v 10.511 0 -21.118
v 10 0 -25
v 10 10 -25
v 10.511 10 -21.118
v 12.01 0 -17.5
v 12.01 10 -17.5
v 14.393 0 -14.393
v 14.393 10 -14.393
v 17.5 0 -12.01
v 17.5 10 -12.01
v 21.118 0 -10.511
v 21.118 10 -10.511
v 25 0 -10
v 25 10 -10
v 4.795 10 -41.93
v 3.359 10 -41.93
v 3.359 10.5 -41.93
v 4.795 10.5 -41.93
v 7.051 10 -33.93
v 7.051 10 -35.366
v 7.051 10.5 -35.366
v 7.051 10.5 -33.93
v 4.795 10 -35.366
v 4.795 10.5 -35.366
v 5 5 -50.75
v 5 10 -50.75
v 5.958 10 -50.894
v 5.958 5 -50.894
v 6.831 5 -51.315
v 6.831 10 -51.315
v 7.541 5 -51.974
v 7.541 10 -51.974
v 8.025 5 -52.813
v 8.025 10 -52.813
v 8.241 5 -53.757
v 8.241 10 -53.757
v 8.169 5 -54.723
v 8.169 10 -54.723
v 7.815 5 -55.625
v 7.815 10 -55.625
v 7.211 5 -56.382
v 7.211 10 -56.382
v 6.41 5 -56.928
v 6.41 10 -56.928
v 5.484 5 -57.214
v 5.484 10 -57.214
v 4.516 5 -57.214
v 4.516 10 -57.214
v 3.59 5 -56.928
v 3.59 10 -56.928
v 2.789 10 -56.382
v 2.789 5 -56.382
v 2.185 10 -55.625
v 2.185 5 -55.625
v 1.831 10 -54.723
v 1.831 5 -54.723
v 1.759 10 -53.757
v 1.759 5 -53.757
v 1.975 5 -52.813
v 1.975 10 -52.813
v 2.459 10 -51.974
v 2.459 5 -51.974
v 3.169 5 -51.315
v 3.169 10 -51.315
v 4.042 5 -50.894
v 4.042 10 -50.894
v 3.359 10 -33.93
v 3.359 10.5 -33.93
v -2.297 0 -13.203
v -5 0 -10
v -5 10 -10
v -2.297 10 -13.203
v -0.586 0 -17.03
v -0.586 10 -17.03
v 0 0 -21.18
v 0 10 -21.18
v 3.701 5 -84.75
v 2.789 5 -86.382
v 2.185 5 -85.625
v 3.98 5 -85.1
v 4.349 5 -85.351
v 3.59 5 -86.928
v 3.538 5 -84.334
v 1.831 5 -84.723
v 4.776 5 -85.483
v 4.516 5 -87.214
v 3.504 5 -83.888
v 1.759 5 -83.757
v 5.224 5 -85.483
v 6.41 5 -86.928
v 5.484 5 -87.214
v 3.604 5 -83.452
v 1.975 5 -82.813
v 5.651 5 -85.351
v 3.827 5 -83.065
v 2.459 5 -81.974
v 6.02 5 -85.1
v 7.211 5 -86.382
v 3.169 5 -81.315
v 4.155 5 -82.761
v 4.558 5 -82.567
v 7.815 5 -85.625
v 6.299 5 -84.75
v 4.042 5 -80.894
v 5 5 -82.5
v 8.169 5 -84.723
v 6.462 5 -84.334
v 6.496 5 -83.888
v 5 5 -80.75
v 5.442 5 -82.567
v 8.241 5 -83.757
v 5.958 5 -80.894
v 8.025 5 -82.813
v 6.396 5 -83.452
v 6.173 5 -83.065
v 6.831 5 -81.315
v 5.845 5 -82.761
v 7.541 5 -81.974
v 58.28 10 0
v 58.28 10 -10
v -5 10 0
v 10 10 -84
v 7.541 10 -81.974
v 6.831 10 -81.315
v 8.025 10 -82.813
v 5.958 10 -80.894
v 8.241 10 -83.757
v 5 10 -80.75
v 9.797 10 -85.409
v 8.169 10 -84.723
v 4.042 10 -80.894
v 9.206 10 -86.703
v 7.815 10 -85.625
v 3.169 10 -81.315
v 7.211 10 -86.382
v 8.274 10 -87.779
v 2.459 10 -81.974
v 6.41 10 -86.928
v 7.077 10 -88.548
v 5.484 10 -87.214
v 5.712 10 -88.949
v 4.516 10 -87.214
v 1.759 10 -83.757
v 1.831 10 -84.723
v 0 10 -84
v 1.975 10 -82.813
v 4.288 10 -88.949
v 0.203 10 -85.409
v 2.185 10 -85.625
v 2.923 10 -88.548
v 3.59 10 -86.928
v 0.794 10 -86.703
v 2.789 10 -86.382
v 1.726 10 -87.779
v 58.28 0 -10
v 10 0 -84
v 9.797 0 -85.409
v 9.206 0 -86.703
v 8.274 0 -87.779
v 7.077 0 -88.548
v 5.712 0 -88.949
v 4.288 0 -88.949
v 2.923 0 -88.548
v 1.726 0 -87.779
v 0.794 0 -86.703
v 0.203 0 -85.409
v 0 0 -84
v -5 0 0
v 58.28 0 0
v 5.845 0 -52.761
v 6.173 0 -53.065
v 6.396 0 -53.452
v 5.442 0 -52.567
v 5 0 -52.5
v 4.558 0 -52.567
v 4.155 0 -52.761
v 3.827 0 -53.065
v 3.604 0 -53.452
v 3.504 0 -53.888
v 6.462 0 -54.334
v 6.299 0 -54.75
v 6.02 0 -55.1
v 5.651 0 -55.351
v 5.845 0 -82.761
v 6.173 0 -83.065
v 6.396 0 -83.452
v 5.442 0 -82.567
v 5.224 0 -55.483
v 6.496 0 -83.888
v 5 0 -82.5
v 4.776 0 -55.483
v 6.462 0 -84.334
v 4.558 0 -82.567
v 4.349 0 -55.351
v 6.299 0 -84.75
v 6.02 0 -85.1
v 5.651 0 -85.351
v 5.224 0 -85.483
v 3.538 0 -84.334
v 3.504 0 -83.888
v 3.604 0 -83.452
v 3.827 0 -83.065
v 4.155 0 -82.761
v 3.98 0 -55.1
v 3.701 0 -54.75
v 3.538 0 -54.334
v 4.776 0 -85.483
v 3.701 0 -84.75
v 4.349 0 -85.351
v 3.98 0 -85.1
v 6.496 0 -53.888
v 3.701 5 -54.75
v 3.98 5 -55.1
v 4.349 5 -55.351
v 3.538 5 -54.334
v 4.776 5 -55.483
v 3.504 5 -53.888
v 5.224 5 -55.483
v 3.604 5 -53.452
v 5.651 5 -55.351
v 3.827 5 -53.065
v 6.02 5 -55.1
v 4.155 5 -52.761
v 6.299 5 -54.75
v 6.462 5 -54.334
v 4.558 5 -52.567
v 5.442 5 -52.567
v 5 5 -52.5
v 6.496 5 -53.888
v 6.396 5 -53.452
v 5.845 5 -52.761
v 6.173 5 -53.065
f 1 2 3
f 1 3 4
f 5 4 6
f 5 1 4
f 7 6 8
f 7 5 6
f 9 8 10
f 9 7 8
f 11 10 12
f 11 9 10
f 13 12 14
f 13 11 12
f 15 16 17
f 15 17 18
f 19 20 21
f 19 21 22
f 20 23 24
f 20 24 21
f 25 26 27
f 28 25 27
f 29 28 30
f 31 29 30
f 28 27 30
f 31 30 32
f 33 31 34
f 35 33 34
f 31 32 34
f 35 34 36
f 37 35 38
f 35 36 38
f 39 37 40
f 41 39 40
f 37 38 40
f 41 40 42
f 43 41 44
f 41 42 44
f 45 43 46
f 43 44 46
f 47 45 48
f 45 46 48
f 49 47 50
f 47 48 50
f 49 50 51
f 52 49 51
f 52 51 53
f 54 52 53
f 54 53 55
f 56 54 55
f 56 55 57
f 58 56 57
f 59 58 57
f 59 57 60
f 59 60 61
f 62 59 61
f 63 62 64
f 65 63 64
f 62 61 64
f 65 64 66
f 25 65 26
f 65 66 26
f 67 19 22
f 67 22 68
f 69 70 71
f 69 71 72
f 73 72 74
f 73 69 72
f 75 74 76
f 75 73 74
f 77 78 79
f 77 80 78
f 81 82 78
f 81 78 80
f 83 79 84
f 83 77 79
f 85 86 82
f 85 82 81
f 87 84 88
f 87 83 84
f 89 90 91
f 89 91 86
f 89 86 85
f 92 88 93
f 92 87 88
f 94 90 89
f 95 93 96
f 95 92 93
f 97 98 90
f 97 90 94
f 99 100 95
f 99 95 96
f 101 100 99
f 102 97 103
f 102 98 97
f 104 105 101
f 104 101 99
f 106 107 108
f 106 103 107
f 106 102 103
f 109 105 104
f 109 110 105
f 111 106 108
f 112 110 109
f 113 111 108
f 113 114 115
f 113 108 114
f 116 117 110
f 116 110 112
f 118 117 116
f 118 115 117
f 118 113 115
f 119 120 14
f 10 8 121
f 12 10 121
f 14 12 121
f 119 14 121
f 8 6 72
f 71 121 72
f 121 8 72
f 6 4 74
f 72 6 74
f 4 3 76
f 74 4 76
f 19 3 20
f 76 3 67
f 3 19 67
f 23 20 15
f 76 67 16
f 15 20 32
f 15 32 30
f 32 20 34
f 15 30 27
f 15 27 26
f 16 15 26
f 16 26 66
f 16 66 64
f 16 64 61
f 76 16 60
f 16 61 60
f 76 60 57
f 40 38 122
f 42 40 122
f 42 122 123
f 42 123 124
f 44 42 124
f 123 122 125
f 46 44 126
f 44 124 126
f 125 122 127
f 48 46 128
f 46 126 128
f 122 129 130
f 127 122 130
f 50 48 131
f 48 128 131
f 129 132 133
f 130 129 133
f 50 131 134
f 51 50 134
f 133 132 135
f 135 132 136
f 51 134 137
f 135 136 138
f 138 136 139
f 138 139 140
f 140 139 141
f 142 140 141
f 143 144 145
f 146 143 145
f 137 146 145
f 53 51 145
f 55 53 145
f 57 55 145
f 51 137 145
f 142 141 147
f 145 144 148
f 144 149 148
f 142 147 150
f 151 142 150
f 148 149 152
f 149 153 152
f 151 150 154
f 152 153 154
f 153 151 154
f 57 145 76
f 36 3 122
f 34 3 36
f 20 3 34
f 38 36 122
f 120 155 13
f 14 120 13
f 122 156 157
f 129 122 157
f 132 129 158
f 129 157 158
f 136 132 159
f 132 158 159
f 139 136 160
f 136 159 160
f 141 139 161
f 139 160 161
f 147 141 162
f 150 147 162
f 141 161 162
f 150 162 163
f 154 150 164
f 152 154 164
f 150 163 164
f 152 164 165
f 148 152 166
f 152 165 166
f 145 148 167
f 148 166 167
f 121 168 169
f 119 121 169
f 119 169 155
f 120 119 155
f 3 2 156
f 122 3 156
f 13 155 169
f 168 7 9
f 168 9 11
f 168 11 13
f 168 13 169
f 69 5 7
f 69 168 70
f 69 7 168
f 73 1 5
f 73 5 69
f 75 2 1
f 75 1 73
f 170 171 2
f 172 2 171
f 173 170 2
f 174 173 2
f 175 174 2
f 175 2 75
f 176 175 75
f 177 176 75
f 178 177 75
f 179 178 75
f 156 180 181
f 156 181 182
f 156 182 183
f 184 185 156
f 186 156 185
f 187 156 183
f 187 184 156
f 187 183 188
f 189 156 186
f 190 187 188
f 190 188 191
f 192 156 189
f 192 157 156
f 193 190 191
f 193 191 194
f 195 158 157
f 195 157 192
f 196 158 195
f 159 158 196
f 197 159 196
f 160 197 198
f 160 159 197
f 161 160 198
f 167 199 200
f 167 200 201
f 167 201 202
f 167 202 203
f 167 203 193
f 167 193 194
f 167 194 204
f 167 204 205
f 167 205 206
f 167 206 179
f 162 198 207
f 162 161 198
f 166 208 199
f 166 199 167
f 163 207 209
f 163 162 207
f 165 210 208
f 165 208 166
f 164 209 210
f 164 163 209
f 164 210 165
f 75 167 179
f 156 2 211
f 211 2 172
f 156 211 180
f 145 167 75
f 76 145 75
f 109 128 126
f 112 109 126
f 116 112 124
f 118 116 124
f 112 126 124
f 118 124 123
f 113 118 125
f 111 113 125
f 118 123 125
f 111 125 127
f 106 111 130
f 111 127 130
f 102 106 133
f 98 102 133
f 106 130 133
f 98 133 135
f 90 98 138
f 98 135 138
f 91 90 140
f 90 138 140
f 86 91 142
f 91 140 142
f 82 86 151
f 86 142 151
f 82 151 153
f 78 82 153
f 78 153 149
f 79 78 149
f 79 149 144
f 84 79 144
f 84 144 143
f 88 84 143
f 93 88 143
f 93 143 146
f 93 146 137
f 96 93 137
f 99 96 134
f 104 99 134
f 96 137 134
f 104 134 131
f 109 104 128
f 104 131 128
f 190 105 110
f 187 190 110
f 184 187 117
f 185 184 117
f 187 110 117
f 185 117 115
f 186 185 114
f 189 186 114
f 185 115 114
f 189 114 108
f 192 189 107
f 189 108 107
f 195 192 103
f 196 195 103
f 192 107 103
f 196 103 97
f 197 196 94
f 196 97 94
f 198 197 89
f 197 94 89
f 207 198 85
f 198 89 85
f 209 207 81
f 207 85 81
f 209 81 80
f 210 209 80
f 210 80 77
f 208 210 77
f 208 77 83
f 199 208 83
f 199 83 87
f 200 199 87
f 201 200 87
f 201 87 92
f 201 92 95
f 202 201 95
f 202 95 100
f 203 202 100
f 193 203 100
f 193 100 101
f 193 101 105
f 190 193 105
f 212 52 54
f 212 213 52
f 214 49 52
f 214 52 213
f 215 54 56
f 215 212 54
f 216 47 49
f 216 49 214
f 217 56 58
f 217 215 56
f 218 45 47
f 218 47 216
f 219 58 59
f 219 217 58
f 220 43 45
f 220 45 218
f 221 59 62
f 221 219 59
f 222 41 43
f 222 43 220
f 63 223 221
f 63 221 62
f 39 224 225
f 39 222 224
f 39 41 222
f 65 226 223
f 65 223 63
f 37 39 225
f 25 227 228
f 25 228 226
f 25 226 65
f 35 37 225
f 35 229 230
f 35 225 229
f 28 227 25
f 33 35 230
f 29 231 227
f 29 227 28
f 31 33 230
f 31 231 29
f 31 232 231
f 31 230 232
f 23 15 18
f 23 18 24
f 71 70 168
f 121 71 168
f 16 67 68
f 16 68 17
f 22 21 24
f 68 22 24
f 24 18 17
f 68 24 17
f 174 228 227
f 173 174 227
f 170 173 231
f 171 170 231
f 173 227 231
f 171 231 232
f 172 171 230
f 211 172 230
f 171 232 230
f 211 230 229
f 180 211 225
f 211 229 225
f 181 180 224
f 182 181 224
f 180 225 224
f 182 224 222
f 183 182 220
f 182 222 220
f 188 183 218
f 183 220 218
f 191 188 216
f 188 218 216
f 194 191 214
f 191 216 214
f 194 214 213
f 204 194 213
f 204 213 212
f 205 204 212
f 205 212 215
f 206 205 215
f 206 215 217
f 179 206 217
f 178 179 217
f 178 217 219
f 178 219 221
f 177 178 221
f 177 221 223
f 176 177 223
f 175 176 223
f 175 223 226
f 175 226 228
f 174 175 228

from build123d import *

# Parameters (mm, degrees)
BOSS_EXTRUDE1_DEPTH = 10
SKETCH2_R           = 1.5
CUT_EXTRUDE1_DEPTH  = 107.852975625
BOSS_EXTRUDE2_DEPTH = 0.5
SKETCH5_R           = 3.25
CUT_EXTRUDE2_DEPTH  = 5
FILLET1_R           = 15


with BuildPart() as part:
    # Sketch1 → Boss-Extrude1 (new body)
    with BuildSketch(Plane(origin=(0, 0, 0), x_dir=(1, 0, 0), z_dir=(0, 1, 0))):
        with BuildLine():
            Line((0, 0), (10, 0))
            Line((10, 0), (58.28, 0))
            Line((58.28, 0), (58.28, 10))
            Line((58.28, 10), (10, 10))
            Line((10, 10), (10, 84))
            ThreePointArc((10, 84), (5, 89), (0, 84))
            Line((0, 84), (0, 10))
            Line((0, 10), (-5, 10))
            Line((-5, 10), (-5, 0))
            Line((-5, 0), (0, 0))
        make_face()
    extrude(amount=BOSS_EXTRUDE1_DEPTH)

    # Sketch2 → Cut-Extrude1 (cut, through all)
    with BuildSketch(Plane(origin=(0, 10, 0), x_dir=(1, 0, 0), z_dir=(0, 1, 0))):
        with Locations(Location((5, 84, 0), (0, 0, 270))):
            Circle(SKETCH2_R)
        with Locations(Location((5, 54, 0), (0, 0, 270))):
            Circle(SKETCH2_R)
    extrude(amount=-CUT_EXTRUDE1_DEPTH, mode=Mode.SUBTRACT)

    # Sketch4 → Boss-Extrude2 (add)
    with BuildSketch(Plane(origin=(0, 10, 0), x_dir=(1, 0, 0), z_dir=(0, 1, 0))):
        Polygon((3.358974359, 41.930004151), (4.794871795, 41.930004151), (4.794871795, 35.365901587), (7.051282051, 35.365901587), (7.051282051, 33.930004151), (3.358974359, 33.930004151), align=None)
    extrude(amount=BOSS_EXTRUDE2_DEPTH)

    # Sketch5 → Cut-Extrude2 (cut)
    with BuildSketch(Plane(origin=(0, 10, 0), x_dir=(1, 0, 0), z_dir=(0, 1, 0))):
        with Locations(Location((5, 84, 0), (0, 0, 270))):
            Circle(SKETCH5_R)
        with Locations(Location((5, 54, 0), (0, 0, 270))):
            Circle(SKETCH5_R)
    extrude(amount=-CUT_EXTRUDE2_DEPTH, mode=Mode.SUBTRACT)

    # Fillet1
    # the kernel refuses this fillet: 15 mm, written as the material it adds along each edge
    with BuildSketch(Plane(origin=(0, 0, -10), x_dir=(-1, 0, 0), z_dir=(0, 1, 0))) as fillet1_piece_1:
        with BuildLine():
            CenterArc((15, -11.180339887), FILLET1_R, 131.810314896, 48.189685104)
            Line((0, -11.180339887), (-0.3, -11.180339887))
            Line((-0.3, -11.180339887), (-0.3, 0))
            Line((-0.3, 0), (0, 0.3))
            ThreePointArc((0, 0.3), (2.5, 0.3), (4.8, 0.223606798))
            Line((4.8, 0.223606798), (5, 0))
        make_face()
    extrude(amount=10)
    with BuildSketch(Plane(origin=(10, 0, -10), x_dir=(1, 0, 0), z_dir=(0, 1, 0))) as fillet1_piece_2:
        with BuildLine():
            CenterArc((FILLET1_R, FILLET1_R), FILLET1_R, 180, 90)
            Line((0, FILLET1_R), (-FILLET1_R * 0.02, FILLET1_R))
            Line((-FILLET1_R * 0.02, FILLET1_R), (-FILLET1_R * 0.02, -FILLET1_R * 0.02))
            Line((-FILLET1_R * 0.02, -FILLET1_R * 0.02), (FILLET1_R, -FILLET1_R * 0.02))
            Line((FILLET1_R, -FILLET1_R * 0.02), (FILLET1_R, 0))
        make_face()
    extrude(amount=10)


solid = part.part
